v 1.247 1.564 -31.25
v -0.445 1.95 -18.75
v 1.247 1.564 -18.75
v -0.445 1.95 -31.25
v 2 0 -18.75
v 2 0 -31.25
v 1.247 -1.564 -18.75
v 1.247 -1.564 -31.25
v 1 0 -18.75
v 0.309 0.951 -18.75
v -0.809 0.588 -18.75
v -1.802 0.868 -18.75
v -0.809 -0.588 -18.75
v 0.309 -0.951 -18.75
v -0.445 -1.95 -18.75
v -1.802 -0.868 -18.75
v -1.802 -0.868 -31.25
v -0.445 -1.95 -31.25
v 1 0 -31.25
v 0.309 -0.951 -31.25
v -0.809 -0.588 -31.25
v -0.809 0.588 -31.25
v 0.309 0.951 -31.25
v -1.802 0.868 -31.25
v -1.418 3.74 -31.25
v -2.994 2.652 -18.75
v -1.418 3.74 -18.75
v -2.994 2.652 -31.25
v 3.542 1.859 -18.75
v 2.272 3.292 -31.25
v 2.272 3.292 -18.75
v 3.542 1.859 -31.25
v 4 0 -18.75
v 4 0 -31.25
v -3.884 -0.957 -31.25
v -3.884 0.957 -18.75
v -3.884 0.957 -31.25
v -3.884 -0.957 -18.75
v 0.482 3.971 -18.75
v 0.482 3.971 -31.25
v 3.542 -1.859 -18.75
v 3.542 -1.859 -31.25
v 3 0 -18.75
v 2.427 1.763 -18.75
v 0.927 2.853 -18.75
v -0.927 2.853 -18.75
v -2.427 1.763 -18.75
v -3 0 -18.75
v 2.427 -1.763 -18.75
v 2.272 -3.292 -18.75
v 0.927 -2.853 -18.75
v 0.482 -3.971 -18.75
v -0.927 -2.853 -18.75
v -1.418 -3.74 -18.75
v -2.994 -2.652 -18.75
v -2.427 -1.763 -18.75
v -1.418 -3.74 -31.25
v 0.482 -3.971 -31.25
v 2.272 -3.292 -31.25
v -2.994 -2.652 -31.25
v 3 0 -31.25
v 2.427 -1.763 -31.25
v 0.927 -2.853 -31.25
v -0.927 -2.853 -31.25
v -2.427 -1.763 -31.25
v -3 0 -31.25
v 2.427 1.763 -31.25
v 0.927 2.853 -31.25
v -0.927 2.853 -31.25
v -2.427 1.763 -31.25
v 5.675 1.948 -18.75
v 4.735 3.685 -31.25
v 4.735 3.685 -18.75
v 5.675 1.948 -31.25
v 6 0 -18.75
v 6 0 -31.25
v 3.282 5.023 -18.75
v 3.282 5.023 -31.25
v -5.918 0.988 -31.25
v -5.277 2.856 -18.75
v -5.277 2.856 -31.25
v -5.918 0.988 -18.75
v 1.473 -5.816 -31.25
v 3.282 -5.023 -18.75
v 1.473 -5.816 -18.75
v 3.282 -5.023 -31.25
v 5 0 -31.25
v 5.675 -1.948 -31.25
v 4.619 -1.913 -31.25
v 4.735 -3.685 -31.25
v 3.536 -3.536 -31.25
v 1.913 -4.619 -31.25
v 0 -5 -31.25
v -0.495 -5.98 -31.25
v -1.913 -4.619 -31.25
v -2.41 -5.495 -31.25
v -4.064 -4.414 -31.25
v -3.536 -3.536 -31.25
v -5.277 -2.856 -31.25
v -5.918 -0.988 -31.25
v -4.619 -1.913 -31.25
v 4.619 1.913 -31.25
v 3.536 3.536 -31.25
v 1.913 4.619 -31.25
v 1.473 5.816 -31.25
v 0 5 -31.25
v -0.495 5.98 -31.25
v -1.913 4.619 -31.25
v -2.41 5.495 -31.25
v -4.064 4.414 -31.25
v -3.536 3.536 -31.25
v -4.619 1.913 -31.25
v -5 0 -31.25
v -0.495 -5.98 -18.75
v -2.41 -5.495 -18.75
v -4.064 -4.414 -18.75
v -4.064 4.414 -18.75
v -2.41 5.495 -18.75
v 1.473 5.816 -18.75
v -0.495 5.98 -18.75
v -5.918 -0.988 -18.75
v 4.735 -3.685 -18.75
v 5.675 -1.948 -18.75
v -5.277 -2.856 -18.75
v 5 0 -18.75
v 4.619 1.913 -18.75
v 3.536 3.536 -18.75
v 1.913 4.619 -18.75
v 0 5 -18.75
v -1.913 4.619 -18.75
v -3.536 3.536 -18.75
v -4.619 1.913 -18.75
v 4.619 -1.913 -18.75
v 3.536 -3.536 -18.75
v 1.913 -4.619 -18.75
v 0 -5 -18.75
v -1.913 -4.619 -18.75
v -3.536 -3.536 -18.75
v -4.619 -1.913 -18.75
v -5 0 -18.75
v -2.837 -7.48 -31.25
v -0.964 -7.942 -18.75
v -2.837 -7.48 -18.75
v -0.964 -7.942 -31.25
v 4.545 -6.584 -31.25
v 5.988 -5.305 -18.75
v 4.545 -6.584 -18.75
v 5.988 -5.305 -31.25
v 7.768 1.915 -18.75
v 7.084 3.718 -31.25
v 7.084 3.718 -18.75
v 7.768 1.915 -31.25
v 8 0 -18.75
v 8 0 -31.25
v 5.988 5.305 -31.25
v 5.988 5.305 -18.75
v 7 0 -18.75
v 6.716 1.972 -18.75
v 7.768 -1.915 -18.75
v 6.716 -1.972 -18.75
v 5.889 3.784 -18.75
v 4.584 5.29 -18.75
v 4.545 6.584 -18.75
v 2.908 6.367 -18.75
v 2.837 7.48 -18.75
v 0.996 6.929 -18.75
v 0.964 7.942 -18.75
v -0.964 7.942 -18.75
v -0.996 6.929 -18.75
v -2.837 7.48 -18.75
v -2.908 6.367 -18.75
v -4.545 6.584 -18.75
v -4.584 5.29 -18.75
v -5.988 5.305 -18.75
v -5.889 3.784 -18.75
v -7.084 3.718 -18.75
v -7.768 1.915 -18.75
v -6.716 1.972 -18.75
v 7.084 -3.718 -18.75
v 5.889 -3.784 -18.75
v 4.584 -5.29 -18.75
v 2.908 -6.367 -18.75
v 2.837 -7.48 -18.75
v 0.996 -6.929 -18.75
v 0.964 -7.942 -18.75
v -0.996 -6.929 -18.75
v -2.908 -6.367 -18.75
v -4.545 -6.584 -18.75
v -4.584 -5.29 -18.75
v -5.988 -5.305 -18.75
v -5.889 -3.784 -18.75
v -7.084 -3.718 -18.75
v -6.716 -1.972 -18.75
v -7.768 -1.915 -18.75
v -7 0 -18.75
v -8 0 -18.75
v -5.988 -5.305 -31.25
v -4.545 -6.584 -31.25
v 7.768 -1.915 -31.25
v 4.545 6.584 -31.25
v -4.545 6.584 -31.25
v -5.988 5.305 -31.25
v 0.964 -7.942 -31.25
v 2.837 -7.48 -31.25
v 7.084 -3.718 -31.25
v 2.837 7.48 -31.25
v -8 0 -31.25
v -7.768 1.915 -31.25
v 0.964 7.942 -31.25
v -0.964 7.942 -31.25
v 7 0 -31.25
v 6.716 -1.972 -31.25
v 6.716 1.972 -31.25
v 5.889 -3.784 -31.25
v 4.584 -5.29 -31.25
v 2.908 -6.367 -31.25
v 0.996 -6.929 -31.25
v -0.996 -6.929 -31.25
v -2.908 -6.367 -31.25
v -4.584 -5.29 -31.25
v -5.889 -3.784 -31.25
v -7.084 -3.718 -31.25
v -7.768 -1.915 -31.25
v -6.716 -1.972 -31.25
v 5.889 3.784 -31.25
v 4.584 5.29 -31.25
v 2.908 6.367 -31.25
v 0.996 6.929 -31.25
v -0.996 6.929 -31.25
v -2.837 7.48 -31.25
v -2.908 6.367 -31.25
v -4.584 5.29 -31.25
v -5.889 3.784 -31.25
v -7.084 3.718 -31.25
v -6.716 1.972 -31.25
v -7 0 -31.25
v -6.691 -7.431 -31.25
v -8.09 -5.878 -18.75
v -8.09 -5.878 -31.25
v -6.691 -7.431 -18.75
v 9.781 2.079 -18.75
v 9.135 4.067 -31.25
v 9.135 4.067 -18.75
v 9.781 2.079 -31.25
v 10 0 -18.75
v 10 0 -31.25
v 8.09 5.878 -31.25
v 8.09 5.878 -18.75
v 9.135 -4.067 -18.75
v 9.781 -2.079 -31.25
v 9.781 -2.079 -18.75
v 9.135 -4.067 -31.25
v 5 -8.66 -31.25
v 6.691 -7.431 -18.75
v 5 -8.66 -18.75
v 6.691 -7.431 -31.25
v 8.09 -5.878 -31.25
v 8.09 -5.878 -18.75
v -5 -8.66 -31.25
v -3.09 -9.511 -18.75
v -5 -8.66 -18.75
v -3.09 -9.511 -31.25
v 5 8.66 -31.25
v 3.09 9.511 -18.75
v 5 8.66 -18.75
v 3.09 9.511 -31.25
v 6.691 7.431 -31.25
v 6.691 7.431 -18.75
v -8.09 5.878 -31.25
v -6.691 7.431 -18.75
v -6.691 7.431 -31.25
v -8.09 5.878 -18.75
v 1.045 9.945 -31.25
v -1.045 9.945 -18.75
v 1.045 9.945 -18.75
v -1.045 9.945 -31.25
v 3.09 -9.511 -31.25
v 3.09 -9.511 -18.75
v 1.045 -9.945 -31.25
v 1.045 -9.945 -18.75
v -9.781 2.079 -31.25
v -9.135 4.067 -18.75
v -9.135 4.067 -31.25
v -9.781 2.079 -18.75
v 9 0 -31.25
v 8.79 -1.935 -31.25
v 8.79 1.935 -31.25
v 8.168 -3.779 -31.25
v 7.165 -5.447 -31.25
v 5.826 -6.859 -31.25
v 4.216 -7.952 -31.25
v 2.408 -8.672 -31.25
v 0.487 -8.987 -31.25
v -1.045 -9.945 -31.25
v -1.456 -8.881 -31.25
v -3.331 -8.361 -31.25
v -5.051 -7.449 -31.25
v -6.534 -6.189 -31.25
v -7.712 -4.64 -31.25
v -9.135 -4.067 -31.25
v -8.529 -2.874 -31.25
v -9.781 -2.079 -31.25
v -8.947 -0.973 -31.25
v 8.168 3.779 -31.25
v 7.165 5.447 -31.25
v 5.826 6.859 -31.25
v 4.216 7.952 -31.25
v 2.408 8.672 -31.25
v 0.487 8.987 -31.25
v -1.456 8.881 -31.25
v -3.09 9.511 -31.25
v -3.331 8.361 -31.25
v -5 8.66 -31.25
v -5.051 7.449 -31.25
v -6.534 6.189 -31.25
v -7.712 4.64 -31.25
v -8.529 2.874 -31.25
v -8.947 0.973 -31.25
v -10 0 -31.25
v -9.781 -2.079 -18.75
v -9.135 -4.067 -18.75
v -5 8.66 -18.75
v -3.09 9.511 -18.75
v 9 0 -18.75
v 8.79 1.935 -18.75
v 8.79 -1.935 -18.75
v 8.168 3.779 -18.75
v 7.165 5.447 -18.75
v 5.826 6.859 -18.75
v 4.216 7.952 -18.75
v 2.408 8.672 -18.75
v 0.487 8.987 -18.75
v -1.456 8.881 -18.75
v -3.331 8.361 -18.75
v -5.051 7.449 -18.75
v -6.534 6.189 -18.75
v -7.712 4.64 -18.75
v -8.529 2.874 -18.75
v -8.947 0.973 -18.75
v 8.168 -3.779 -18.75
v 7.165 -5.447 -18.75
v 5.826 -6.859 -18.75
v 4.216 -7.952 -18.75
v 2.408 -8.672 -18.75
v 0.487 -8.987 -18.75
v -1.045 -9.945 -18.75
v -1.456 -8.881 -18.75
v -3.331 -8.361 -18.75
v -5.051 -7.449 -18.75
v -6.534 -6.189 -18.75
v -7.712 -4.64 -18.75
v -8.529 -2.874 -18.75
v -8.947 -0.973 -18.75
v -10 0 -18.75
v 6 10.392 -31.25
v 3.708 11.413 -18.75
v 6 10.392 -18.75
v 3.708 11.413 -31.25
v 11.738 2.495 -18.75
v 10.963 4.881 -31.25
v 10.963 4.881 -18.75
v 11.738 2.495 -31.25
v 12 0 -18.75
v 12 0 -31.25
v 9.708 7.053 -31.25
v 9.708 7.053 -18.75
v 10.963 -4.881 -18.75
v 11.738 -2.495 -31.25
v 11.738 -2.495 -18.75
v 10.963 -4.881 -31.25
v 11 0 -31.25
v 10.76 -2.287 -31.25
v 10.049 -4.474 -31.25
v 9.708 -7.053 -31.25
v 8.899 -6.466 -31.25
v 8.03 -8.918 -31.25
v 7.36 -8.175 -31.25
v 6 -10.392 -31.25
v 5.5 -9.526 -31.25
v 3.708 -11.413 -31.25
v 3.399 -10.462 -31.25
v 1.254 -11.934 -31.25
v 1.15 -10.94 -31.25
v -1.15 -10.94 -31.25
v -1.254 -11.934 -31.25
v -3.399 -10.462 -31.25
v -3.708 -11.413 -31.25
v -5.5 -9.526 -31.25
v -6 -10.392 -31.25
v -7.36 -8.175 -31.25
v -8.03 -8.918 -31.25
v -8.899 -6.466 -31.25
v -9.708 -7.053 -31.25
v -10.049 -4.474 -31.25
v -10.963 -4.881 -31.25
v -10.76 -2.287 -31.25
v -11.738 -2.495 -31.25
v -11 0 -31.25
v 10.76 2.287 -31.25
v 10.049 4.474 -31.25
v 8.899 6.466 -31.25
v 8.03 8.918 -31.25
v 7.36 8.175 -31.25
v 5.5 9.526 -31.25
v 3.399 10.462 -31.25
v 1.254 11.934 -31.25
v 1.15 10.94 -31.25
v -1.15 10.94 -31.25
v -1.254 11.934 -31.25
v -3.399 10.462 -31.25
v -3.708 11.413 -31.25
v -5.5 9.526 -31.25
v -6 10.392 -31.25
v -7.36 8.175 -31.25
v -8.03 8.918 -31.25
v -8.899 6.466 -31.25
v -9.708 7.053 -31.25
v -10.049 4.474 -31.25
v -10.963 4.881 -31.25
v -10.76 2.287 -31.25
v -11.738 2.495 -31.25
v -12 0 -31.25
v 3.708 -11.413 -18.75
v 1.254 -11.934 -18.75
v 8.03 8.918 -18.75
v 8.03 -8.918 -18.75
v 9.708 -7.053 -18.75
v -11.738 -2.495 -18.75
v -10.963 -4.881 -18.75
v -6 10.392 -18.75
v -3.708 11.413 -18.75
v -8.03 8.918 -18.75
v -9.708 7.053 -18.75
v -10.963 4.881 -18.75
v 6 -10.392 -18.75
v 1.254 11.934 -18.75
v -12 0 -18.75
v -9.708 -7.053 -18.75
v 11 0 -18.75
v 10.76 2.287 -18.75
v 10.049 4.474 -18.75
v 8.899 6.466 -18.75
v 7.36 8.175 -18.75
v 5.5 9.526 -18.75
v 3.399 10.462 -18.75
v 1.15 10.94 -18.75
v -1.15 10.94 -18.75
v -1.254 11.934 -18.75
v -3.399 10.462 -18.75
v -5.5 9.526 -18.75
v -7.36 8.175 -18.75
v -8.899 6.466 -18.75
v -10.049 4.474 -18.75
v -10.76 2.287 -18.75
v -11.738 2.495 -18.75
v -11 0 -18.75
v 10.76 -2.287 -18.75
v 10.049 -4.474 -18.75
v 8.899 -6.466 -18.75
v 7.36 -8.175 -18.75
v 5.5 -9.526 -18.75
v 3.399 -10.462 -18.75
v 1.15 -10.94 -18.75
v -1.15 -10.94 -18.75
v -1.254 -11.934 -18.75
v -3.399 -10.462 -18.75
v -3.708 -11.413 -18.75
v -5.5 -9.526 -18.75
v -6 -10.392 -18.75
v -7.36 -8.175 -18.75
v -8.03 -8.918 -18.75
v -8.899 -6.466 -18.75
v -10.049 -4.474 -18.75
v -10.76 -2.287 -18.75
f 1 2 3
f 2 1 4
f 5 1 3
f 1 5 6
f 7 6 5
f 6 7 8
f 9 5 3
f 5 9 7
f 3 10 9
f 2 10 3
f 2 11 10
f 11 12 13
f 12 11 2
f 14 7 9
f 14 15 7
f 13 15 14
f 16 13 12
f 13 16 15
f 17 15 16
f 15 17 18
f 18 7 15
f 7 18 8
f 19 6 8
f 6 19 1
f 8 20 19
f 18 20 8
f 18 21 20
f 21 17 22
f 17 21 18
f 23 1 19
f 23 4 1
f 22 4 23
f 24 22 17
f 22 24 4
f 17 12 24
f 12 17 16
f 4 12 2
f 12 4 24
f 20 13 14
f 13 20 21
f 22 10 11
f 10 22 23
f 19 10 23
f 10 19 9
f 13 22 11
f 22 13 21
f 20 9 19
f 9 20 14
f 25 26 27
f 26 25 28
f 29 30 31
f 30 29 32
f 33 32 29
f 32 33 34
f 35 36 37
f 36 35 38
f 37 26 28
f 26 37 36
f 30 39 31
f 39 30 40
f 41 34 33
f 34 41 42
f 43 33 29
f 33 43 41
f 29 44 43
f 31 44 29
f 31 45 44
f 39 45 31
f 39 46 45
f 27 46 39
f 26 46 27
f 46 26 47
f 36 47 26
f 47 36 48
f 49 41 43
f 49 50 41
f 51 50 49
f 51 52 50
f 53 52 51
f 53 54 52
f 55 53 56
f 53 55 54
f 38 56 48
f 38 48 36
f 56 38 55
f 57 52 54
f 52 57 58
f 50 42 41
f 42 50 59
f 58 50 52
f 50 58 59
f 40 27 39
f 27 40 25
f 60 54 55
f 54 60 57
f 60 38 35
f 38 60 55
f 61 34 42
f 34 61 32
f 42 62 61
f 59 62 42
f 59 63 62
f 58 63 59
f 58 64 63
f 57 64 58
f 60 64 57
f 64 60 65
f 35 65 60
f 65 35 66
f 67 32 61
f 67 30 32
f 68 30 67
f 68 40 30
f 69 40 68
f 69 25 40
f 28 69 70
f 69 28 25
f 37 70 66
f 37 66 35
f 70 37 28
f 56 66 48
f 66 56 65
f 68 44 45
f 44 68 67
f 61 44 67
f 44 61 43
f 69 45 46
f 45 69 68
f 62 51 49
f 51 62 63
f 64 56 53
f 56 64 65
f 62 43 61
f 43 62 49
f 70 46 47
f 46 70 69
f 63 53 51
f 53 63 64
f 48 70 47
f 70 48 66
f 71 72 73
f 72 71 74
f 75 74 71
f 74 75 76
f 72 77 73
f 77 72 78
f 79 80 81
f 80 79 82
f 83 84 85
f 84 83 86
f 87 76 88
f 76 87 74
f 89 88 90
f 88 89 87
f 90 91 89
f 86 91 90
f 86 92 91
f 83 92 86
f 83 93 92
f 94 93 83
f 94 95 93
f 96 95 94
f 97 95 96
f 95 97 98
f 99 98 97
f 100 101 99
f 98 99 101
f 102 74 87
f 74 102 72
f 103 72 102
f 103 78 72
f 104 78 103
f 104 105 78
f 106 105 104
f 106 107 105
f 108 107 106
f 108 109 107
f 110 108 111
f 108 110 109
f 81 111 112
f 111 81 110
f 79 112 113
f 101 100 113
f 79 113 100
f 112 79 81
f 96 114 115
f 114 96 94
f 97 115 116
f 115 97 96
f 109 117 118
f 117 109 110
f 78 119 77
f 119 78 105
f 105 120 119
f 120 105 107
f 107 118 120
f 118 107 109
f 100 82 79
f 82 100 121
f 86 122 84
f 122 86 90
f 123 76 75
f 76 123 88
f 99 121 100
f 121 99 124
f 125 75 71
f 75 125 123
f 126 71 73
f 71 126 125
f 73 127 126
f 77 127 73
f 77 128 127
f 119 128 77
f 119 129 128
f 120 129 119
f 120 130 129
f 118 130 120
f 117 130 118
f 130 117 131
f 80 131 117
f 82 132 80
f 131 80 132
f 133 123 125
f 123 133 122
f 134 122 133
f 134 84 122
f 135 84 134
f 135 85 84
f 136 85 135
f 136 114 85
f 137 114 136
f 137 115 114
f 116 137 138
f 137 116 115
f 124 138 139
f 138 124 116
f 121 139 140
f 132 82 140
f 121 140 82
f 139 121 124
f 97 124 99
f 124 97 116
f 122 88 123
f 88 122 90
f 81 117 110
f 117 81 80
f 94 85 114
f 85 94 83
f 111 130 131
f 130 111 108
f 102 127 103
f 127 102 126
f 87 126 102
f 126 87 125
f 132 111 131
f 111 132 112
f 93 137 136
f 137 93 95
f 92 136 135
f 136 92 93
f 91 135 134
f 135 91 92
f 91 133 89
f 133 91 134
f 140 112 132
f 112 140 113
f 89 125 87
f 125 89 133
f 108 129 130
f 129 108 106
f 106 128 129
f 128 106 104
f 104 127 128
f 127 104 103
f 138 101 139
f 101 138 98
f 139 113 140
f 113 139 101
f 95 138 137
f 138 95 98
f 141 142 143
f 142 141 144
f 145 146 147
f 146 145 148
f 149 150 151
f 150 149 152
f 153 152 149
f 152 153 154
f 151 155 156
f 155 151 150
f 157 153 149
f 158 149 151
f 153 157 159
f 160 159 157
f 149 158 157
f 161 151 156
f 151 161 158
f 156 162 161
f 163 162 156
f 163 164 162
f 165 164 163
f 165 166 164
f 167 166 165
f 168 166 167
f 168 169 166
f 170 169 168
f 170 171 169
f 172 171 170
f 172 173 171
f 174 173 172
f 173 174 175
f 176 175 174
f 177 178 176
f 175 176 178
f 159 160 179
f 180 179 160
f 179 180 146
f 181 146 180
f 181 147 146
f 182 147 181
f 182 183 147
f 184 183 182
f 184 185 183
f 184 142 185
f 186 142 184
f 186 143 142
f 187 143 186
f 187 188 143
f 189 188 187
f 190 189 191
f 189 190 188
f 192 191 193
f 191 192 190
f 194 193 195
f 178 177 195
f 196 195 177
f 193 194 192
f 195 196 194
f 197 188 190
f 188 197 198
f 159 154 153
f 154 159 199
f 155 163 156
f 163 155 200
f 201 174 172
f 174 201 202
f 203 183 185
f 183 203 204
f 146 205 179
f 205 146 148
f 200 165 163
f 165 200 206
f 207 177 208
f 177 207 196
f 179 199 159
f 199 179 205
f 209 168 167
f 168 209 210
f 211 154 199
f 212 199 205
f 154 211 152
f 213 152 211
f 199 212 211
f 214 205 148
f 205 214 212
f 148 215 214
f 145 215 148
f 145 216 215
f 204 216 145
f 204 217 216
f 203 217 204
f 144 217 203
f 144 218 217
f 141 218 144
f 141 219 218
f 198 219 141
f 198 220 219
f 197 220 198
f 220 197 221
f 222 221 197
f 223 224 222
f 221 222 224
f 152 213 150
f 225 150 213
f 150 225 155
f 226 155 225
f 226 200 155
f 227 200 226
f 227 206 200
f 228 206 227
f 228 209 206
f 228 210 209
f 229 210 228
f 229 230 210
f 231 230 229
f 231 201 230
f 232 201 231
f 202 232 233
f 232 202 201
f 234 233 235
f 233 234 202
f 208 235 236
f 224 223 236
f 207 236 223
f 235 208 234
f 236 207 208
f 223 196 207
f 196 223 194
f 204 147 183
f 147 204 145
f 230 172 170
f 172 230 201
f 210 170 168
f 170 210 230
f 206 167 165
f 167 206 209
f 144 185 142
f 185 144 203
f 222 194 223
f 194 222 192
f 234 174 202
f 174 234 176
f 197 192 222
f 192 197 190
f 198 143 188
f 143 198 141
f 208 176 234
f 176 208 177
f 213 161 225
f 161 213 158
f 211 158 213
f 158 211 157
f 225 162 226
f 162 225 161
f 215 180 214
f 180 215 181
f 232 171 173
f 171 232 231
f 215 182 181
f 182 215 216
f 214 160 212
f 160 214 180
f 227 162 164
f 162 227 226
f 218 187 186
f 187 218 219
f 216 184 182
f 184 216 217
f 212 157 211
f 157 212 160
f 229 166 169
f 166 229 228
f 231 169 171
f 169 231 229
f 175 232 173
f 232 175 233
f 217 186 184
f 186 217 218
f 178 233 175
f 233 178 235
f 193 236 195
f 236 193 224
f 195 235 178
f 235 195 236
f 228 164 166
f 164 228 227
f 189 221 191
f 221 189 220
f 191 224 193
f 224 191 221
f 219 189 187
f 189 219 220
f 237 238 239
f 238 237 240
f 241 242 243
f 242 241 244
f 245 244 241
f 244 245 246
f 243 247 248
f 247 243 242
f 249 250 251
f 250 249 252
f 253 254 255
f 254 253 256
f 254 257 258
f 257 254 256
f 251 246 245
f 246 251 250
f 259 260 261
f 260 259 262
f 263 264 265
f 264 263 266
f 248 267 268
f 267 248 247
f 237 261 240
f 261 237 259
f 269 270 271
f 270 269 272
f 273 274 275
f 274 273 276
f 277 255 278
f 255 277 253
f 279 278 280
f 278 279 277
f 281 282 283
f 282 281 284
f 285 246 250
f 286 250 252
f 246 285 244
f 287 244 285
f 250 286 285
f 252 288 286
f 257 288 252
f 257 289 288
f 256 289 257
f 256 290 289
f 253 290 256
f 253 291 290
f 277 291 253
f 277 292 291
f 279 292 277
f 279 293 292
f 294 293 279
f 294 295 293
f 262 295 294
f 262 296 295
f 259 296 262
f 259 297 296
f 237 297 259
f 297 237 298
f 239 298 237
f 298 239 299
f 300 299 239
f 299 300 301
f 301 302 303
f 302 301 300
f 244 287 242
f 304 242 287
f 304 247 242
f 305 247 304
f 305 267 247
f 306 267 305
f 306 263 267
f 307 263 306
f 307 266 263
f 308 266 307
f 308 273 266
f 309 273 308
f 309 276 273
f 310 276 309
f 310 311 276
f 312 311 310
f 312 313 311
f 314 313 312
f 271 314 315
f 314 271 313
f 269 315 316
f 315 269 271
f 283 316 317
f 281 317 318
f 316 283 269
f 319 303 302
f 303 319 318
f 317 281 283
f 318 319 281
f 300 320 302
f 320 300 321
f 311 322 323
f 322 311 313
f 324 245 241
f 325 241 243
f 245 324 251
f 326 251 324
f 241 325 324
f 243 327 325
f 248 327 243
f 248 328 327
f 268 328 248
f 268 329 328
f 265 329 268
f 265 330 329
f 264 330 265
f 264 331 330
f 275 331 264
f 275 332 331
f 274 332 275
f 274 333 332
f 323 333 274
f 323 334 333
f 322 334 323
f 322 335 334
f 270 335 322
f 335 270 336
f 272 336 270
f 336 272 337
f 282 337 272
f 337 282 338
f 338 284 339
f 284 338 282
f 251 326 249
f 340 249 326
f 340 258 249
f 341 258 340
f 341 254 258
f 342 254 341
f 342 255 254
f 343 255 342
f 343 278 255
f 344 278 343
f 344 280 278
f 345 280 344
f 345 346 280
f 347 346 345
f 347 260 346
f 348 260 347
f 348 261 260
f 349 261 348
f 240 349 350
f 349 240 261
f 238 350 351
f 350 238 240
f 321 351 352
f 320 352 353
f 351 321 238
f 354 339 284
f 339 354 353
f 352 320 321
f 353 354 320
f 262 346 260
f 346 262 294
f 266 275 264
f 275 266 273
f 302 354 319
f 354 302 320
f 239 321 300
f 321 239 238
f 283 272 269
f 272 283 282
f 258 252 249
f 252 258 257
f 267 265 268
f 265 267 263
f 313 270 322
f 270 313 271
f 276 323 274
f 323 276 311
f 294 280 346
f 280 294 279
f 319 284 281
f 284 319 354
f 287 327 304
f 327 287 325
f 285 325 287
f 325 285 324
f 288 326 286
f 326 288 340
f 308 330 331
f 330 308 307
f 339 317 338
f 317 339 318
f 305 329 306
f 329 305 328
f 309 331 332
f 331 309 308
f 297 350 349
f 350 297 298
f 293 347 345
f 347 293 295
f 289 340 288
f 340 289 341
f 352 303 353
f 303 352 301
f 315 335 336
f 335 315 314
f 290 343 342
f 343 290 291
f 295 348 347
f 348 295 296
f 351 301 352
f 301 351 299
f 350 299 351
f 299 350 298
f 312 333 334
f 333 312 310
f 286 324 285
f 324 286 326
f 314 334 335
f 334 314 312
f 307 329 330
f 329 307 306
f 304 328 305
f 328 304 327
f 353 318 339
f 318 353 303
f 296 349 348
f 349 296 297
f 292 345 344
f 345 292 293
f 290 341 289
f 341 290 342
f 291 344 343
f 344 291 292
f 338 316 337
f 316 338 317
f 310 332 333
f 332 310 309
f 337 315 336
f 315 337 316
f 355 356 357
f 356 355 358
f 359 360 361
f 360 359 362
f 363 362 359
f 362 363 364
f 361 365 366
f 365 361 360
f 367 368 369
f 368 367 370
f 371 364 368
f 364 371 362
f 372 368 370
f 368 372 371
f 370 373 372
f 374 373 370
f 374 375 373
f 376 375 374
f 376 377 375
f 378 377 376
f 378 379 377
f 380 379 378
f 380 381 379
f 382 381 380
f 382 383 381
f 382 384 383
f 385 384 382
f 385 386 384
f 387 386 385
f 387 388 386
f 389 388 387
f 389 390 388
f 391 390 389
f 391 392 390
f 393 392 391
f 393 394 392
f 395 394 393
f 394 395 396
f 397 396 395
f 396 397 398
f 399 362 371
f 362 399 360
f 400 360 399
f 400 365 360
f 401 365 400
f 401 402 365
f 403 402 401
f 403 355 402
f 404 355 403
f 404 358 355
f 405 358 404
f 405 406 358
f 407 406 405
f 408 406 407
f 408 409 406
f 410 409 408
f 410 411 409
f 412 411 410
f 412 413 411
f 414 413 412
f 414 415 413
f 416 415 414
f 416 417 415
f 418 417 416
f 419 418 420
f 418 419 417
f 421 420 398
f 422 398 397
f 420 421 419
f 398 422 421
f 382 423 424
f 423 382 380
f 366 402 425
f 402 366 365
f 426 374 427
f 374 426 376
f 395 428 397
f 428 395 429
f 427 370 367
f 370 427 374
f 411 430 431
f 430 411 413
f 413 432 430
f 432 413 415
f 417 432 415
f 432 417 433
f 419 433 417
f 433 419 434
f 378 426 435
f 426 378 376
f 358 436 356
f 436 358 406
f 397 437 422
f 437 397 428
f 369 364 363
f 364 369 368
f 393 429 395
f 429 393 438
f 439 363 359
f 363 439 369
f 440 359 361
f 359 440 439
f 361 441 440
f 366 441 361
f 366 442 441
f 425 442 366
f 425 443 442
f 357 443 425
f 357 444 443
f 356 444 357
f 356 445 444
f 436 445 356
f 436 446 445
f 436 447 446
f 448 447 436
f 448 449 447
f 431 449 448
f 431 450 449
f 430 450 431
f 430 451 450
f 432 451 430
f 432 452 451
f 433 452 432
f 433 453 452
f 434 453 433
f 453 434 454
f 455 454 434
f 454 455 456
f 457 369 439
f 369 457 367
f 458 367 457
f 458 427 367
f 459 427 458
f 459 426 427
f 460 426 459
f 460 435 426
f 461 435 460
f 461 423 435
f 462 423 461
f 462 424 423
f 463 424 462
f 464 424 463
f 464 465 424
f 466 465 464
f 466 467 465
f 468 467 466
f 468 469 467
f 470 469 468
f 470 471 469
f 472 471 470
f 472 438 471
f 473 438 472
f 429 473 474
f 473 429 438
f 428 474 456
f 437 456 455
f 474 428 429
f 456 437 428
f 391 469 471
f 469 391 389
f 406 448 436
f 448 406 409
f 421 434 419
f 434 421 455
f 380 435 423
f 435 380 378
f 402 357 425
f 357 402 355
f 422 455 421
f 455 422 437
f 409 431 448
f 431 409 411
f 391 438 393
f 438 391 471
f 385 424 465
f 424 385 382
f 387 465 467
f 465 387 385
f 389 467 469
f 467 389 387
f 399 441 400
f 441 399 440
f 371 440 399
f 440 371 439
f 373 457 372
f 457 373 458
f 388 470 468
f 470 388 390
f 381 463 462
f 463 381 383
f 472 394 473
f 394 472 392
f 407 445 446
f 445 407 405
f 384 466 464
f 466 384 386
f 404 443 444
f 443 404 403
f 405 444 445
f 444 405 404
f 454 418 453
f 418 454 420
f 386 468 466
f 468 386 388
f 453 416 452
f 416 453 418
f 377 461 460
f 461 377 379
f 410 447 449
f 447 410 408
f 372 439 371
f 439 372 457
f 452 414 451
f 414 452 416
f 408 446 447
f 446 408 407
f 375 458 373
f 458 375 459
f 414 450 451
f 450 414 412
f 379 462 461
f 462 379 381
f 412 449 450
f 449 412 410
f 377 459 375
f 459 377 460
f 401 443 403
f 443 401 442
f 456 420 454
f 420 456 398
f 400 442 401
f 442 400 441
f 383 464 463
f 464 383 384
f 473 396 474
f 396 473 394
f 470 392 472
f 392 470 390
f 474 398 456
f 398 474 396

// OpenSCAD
num = 200;
radius = 25;


golden_ratio = (1 + sqrt(5)) / 2;


function points(r, num_points) = 
    let (step = 360 / num_points)
    [for(angle = [0 : step : 360]) [r * cos(angle), r * sin(angle)]];
    

function phi(i, N) = acos(1 - 2 * (i+ 0.5) / N);

function theta(i) = 360 * i / golden_ratio;

function norm(x,y,z, R) = [x/R, y/R, z/R];

module fib_sphere(N, r, R) {
        
    for(n = [0:N-1]) {
        p = phi(n, N);
        t = theta(n);
        
        x = sin(p) * cos(t); 
        y = sin(p) * sin(t); 
        z = cos(p);          
        
        direction = norm(x, y, z, r);
        axis = cross([0,0,1], direction);
        
        angle = acos(z / (sqrt(x*x + y*y + z*z)));
        
        translate([x*r, y*r, z*r])
            sphere(R, $fn=30);
    }
}

module fib_poly(N, r, R) {
        
    for(n = [0:N-1]) {
        p = phi(n, N);
        t = theta(n);
        
        x = sin(p) * cos(t); 
        y = sin(p) * sin(t); 
        z = cos(p);          
        
        direction = norm(x, y, z, r);
        axis = cross([0,0,1], direction);
        
        angle = acos(z / (sqrt(x*x + y*y + z*z)));
        
        translate([x, y, z])
          rotate(angle, axis)
                linear_extrude(r) {
                    rotate([0,0,30])
                    polygon(points(R, 6));
                }
    }
}



surface_area = 4 * PI * radius * radius;
area_per = surface_area / num;
R = sqrt(area_per / PI) * 1.2;
    
//difference() {
//    sphere(radius + (R*0.8), $fn = 100);
//    sphere(radius - (R*0.7));
//    fib_sphere(num, radius, R);
//}
//
//translate([0,0,0-0.1])
//difference() {
//translate([0,0,-radius*1.25])
//cylinder(radius / 2, radius / 2, radius /2);
//
//sphere(radius + (R*0.8), $fn = 100);
//}

translate([0,0,-radius*1.25])

    for(r = [2: 2: radius / 2]){
        difference() {
                cylinder(radius / 2, r, r);
                cylinder(radius / 2, r-1, r-1);
        }
    }
    
